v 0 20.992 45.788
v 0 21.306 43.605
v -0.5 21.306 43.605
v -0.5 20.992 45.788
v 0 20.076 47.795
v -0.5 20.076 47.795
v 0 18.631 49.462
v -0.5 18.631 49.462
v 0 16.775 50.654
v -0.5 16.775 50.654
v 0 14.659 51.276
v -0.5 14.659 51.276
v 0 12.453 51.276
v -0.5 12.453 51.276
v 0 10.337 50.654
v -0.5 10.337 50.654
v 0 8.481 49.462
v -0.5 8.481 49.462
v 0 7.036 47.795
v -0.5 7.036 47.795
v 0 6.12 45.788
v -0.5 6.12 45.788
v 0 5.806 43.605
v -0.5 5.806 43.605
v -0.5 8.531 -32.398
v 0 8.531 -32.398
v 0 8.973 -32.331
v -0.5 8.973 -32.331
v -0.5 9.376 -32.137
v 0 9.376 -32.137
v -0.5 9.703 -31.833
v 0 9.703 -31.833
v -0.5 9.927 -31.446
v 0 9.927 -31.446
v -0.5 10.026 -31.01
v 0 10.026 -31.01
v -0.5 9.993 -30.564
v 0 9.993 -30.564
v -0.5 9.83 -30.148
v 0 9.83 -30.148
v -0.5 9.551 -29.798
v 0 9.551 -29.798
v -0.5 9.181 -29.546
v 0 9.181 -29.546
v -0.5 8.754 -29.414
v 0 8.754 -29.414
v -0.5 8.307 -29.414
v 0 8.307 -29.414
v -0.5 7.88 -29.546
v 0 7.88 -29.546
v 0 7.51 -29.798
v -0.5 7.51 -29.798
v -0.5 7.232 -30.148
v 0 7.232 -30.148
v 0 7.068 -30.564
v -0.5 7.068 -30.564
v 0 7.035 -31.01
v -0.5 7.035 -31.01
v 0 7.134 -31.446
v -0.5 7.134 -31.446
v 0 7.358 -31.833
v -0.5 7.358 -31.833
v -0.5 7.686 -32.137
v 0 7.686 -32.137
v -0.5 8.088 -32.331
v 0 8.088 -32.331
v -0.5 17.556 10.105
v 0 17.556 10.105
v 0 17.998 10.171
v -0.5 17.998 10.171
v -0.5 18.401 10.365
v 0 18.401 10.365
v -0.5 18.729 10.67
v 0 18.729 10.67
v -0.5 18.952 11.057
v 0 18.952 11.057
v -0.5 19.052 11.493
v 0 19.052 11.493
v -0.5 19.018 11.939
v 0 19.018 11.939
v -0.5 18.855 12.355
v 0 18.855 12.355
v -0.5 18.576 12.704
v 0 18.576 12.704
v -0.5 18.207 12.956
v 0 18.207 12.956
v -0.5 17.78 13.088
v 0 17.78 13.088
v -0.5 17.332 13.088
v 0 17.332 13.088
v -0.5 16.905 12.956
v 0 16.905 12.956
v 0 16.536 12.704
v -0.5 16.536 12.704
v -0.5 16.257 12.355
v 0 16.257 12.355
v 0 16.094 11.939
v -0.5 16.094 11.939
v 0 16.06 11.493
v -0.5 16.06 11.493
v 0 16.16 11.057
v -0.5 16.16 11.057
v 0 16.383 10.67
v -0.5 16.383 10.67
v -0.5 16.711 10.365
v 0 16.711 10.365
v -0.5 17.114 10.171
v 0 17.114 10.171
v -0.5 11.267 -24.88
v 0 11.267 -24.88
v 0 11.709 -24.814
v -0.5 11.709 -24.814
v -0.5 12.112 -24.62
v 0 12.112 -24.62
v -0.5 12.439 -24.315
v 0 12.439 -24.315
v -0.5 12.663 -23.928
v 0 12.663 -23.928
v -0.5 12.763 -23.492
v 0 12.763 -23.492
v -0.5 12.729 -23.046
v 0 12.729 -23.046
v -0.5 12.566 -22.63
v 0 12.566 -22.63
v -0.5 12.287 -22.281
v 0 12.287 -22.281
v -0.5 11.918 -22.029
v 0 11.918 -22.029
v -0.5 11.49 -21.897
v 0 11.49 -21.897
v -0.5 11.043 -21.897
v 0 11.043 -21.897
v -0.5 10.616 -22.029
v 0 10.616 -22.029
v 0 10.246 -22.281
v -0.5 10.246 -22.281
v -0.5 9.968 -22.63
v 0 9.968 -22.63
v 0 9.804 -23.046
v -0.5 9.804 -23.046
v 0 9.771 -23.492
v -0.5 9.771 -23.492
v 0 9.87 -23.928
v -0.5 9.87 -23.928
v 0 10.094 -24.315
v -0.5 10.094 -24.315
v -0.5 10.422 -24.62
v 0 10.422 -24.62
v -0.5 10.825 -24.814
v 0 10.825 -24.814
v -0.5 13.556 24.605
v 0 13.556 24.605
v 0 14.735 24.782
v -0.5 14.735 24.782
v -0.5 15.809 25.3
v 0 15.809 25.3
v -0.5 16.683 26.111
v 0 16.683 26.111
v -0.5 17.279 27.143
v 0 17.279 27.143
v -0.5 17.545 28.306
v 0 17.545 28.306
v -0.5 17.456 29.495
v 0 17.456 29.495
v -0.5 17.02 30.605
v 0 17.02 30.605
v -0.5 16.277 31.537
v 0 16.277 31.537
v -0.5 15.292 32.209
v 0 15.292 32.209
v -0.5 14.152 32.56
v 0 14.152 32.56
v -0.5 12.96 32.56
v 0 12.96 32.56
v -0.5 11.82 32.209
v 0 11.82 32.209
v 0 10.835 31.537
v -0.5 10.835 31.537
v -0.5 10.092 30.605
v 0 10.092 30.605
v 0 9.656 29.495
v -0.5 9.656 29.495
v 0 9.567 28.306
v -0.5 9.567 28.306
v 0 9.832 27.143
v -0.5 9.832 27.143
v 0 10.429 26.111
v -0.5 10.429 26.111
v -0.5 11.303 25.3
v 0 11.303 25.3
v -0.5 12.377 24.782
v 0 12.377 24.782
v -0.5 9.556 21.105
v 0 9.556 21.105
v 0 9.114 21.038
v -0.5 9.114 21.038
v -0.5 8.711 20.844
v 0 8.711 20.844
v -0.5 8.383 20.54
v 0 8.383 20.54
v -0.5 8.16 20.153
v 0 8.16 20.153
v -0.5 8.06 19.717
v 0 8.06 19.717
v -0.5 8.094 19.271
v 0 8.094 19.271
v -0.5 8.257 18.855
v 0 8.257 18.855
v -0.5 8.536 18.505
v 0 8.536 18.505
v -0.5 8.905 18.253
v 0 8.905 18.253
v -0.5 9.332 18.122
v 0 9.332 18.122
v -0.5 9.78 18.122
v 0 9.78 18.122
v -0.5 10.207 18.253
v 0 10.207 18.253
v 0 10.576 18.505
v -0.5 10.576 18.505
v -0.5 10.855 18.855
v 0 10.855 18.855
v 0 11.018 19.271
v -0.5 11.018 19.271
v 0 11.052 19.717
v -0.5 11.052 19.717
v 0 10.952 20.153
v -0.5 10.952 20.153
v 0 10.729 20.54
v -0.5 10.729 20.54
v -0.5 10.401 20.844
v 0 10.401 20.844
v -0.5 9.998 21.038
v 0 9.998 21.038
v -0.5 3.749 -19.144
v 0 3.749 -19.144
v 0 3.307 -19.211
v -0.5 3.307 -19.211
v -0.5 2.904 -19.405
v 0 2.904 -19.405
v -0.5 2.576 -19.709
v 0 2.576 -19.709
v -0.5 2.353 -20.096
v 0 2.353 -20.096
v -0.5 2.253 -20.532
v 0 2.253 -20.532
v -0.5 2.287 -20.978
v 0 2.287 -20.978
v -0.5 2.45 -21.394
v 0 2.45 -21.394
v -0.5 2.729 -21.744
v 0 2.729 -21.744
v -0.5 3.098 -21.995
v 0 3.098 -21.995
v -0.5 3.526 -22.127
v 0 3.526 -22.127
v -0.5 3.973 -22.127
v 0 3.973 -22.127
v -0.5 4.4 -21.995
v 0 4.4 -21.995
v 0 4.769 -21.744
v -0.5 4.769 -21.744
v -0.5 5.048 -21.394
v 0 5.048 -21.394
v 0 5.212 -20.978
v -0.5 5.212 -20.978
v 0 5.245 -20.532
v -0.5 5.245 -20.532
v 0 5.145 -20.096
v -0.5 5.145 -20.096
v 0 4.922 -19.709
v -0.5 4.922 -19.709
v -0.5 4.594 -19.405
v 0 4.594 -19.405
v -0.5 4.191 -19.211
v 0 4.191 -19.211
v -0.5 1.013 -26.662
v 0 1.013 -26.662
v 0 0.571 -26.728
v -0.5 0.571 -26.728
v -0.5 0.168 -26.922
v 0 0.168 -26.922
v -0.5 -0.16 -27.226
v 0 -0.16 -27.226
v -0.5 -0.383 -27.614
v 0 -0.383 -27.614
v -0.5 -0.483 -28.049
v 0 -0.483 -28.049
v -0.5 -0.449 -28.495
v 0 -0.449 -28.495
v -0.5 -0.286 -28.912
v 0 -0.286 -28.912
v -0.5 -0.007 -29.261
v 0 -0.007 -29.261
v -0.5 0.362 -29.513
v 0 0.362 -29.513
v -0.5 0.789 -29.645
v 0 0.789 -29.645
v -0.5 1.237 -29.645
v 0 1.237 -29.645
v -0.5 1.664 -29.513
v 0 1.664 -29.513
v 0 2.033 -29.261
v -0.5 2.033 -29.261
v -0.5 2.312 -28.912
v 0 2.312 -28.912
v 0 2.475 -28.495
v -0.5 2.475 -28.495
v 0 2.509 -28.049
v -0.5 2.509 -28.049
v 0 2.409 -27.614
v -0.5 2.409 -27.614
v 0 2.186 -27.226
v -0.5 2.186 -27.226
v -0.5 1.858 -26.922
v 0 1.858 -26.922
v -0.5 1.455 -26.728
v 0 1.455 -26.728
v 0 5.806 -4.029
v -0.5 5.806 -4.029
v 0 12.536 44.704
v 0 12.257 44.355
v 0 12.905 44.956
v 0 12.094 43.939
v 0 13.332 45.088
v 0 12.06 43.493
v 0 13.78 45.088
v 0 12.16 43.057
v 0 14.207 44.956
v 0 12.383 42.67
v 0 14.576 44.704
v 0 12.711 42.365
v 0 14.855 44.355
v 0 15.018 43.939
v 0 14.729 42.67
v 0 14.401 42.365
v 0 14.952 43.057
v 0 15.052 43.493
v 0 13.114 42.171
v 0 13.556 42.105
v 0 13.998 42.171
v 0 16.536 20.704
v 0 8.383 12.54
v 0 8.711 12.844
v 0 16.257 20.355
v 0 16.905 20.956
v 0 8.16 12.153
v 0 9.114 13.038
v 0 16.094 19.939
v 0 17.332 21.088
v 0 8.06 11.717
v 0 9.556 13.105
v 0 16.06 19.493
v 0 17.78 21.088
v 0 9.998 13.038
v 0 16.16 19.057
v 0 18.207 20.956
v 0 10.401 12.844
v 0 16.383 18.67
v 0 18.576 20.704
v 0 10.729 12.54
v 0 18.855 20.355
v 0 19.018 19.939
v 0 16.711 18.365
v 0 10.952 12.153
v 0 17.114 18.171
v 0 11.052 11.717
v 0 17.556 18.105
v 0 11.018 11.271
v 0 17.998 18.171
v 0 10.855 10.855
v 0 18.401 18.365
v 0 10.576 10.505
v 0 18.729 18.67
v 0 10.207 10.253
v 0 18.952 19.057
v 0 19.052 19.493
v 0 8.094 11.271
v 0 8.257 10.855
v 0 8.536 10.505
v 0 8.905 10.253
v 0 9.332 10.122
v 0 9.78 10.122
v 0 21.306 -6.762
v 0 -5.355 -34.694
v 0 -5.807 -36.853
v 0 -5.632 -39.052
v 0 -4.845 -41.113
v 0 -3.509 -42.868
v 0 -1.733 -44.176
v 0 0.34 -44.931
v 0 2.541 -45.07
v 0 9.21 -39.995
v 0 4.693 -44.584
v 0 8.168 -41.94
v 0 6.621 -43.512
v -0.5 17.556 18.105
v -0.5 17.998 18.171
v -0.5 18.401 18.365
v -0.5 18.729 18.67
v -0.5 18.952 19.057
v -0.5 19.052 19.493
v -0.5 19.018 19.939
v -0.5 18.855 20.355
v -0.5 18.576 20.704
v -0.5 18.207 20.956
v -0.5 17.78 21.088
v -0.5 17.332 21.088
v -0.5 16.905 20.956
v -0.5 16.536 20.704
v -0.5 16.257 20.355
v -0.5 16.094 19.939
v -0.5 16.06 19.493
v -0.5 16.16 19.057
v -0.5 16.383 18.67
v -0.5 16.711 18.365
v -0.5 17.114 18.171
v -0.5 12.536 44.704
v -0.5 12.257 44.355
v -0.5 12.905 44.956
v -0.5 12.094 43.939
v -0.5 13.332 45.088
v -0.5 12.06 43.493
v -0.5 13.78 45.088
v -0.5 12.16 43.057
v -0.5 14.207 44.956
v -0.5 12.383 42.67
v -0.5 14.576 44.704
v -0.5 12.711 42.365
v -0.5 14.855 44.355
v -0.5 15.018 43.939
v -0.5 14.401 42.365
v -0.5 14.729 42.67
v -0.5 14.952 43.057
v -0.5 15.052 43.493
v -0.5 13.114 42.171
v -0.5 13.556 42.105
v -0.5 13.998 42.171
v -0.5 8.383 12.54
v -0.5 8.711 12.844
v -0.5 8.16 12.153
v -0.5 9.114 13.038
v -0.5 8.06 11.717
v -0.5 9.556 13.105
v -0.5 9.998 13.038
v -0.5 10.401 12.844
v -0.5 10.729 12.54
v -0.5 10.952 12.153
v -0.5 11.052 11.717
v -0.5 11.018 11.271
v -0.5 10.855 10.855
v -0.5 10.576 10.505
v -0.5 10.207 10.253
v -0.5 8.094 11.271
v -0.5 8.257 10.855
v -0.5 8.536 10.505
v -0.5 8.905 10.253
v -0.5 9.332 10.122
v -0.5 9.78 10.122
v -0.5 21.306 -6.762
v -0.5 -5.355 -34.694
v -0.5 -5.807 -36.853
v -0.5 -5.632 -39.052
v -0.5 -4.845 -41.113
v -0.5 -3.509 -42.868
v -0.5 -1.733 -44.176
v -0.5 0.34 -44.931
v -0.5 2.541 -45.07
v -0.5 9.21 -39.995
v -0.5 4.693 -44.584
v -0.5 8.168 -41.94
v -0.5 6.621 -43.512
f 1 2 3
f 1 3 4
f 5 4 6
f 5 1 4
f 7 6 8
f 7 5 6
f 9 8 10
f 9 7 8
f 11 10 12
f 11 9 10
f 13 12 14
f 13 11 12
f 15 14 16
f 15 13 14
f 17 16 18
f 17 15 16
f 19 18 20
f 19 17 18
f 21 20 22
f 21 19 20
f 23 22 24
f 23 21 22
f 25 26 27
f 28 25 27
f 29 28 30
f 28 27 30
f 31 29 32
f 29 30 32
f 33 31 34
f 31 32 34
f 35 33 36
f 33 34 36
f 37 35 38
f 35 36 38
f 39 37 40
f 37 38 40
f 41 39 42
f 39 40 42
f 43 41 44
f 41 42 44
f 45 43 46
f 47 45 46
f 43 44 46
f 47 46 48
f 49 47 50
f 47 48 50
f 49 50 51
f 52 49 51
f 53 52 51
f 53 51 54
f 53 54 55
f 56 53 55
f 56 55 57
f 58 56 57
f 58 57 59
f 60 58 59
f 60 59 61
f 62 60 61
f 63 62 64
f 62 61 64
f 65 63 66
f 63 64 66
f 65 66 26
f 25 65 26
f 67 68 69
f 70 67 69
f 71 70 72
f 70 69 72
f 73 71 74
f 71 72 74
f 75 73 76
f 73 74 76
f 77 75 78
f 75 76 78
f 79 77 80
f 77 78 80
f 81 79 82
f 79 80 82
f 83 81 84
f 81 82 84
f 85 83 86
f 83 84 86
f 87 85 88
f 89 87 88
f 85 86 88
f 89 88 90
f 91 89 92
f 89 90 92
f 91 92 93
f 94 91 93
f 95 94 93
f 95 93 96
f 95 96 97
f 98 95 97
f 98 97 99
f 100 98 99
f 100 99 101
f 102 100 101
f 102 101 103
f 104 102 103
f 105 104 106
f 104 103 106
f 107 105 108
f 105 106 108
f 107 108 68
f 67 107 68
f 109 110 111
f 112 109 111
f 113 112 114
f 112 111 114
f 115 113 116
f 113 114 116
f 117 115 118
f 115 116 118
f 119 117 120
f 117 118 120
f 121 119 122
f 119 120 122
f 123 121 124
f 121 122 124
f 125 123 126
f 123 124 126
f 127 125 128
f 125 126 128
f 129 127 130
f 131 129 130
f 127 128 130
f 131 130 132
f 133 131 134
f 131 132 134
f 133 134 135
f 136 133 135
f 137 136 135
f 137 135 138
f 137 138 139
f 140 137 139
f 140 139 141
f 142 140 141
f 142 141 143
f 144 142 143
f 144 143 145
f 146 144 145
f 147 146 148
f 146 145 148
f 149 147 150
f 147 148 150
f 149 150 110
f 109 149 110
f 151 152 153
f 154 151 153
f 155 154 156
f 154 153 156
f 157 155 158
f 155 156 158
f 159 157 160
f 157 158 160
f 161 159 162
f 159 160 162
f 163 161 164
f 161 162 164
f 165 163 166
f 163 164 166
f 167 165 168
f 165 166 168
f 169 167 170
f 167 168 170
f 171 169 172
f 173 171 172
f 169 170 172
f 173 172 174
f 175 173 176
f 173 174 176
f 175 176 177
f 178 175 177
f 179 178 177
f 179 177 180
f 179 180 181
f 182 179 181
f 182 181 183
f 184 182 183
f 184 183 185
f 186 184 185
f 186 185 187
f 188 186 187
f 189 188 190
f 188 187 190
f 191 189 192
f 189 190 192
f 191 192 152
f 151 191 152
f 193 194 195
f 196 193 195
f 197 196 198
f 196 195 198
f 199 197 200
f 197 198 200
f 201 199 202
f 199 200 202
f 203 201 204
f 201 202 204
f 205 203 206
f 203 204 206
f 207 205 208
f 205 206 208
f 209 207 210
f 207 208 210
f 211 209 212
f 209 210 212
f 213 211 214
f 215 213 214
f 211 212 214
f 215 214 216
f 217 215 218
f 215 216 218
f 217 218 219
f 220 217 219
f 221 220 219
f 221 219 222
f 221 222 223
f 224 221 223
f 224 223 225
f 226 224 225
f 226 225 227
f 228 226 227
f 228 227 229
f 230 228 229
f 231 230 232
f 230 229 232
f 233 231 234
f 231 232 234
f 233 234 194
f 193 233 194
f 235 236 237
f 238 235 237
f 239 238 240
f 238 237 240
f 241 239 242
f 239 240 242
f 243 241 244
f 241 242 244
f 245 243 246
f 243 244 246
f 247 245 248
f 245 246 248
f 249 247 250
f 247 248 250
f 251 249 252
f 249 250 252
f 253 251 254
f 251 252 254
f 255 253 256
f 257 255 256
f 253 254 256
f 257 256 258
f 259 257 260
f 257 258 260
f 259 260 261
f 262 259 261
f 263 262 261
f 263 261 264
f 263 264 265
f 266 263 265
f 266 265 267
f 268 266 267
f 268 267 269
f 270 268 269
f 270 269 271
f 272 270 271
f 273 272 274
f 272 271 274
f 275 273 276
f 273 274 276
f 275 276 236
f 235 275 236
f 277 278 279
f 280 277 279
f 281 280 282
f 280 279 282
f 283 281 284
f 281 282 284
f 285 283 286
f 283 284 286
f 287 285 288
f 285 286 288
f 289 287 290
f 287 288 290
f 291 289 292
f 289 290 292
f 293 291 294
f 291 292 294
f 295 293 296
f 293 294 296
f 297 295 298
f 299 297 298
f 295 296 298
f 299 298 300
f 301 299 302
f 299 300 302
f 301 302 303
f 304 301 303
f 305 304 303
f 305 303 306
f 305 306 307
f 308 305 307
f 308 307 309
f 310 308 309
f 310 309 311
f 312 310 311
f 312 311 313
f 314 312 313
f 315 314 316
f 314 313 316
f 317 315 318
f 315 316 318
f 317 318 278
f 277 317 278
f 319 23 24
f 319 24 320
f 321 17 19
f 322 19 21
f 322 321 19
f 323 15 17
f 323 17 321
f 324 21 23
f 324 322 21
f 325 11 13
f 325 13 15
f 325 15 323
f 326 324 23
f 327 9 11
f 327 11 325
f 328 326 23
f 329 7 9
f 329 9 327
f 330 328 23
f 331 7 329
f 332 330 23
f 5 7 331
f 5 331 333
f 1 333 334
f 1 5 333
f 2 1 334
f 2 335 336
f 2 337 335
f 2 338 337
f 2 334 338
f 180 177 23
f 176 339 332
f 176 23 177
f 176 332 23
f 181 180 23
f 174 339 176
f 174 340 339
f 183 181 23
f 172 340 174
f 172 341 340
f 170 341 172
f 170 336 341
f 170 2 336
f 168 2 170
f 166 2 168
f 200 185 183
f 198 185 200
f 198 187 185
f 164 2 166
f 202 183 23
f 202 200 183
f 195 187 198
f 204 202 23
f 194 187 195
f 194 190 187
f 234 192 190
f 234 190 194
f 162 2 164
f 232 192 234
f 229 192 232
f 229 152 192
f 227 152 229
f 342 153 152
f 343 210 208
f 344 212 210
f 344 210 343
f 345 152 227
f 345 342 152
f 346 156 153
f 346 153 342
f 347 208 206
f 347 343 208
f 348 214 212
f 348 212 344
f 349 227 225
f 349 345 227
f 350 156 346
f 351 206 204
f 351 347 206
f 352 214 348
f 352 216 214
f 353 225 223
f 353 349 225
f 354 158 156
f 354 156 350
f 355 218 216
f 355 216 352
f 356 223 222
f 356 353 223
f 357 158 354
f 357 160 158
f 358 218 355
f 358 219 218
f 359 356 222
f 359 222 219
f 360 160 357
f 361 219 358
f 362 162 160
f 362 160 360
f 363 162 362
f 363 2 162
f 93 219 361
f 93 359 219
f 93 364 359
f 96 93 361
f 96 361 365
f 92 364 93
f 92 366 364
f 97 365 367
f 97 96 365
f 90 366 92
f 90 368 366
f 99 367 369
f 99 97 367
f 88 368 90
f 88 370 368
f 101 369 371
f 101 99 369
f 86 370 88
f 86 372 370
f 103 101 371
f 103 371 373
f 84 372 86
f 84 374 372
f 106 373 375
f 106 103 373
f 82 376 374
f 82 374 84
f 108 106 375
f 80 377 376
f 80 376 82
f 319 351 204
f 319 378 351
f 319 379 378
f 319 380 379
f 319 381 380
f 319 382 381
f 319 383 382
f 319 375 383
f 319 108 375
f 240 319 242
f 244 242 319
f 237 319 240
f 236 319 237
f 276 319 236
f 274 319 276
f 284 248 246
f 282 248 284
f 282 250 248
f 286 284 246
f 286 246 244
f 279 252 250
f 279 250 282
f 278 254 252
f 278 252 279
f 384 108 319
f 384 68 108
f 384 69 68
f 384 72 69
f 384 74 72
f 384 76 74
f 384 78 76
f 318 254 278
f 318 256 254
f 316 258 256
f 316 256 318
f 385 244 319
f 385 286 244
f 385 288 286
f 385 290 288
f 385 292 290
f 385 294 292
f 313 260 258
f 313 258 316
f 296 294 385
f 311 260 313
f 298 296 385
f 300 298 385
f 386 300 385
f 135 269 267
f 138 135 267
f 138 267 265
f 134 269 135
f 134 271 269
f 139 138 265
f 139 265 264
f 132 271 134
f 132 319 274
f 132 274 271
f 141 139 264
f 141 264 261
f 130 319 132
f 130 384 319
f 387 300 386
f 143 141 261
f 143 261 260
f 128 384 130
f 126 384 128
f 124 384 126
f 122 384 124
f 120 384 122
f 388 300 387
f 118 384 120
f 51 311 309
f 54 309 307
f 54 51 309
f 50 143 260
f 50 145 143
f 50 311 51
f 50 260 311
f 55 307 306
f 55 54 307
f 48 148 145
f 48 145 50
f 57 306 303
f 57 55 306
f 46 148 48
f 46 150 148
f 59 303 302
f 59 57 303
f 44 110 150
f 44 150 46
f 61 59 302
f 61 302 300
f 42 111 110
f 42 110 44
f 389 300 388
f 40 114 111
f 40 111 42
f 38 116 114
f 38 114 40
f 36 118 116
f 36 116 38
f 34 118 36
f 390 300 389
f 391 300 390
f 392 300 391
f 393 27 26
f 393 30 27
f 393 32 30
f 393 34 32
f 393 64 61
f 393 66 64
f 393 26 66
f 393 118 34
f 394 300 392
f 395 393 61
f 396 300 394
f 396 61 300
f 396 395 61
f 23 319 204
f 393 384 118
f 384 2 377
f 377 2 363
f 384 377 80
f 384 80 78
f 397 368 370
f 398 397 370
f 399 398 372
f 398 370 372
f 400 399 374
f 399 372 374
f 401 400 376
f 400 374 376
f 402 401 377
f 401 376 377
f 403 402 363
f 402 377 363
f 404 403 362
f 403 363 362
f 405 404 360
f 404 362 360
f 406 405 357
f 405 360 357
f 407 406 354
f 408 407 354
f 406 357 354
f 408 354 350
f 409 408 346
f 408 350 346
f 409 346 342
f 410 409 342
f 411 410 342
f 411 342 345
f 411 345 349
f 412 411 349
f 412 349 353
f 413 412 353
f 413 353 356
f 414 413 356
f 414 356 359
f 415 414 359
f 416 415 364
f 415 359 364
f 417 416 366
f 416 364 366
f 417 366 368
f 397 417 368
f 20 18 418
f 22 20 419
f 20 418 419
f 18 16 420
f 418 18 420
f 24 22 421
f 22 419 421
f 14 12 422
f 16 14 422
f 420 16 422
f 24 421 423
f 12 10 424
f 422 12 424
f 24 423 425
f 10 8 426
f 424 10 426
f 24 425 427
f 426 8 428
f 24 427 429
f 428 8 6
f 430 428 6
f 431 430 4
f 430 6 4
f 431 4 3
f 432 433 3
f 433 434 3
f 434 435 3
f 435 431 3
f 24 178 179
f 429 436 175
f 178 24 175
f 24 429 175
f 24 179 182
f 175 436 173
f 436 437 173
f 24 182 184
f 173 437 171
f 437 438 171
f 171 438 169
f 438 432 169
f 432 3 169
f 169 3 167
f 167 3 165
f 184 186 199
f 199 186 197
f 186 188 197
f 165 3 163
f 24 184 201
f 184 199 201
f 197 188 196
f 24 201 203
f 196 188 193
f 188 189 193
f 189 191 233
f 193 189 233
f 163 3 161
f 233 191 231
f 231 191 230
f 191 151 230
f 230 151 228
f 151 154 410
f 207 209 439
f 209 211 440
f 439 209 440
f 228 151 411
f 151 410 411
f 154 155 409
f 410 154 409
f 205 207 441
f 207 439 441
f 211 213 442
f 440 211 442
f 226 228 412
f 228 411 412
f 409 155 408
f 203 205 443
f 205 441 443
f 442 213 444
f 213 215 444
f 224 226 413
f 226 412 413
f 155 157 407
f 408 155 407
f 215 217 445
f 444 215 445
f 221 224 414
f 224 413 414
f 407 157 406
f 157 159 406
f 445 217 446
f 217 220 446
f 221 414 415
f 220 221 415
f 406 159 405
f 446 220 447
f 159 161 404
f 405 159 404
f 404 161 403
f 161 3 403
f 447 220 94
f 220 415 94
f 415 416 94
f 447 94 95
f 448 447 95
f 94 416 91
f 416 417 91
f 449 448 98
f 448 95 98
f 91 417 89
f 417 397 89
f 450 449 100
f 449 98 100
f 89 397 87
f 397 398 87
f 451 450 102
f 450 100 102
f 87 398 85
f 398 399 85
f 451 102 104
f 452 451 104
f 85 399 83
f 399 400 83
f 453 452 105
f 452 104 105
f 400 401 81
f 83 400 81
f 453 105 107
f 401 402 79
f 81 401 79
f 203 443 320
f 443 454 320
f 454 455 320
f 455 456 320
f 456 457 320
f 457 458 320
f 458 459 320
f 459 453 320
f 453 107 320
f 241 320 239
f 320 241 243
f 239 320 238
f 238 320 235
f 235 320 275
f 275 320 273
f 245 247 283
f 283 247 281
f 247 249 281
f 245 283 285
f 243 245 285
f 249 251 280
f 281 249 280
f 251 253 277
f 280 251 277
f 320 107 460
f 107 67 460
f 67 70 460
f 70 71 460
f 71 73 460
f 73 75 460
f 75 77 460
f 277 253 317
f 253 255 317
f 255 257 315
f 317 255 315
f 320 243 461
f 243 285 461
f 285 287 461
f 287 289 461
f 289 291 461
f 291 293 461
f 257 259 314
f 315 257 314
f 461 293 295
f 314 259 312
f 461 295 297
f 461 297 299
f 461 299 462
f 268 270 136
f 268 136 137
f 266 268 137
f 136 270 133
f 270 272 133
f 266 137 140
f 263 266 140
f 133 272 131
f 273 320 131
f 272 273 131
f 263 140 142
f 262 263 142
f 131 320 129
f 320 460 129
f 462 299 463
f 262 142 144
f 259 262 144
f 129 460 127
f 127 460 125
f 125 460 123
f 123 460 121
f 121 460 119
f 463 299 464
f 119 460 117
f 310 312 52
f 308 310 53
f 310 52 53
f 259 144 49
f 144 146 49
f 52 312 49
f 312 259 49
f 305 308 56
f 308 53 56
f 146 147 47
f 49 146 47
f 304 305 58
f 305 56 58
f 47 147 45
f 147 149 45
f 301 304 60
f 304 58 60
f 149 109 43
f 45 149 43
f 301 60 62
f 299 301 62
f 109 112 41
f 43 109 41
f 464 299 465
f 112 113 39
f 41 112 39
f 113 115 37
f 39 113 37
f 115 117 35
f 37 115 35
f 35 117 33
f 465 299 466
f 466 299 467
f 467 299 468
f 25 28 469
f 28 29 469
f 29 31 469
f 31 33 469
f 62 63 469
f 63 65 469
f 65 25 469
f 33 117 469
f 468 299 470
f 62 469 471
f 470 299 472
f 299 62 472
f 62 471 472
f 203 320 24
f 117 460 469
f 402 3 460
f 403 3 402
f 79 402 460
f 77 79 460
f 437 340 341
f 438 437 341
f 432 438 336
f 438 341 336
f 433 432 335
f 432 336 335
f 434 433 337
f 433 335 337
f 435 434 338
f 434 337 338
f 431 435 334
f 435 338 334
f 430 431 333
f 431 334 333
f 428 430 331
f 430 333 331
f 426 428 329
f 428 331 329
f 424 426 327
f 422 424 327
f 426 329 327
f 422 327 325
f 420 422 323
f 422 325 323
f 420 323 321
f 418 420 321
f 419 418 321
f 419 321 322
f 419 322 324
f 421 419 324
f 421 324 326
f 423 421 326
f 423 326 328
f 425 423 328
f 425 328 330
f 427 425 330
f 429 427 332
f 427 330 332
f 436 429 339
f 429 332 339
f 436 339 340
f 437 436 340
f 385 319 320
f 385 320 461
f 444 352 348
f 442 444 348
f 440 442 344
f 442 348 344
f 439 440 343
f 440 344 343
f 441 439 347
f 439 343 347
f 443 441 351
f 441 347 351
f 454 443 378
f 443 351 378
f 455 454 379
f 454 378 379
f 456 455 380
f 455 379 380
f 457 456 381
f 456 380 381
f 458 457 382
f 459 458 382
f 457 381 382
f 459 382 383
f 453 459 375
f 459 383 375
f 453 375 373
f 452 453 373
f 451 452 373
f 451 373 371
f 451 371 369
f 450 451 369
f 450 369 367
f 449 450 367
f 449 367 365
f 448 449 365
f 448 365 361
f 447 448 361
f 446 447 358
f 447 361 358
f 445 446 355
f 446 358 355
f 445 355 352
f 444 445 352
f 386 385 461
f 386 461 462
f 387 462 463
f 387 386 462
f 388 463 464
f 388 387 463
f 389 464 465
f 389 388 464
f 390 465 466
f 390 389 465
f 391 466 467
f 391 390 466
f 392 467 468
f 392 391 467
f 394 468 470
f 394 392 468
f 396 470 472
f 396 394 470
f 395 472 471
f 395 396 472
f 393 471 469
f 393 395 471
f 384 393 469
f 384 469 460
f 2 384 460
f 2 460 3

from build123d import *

# Parameters (mm, degrees)
CROQUIS1_R        = 1.5
CROQUIS1_R_2      = 4
BRIDA_BASE1_DEPTH = 0.5


# Sheet-metal steps are written as plain solids
with BuildPart() as part:
    # Croquis1 → Brida base1 (new body)
    with BuildSketch(Plane(origin=(0, 0, 0), x_dir=(0, 0, -1), z_dir=(1, 0, 0))):
        with BuildLine():
            Line((-43.604767051, 5.805989848), (4.028698849, 5.805989848))
            Line((4.028698849, 5.805989848), (34.694125945, -5.355312836))
            ThreePointArc((34.694125945, -5.355312836), (44.627399867, -0.723351136), (39.995438167, 9.209922786))
            Line((39.995438167, 9.209922786), (6.76176705, 21.305989848))
            Line((6.76176705, 21.305989848), (-43.604767051, 21.305989848))
            ThreePointArc((-43.604767051, 21.305989848), (-51.354767051, 13.555989848), (-43.604767051, 5.805989848))
        make_face()
        with Locations((-19.604767051, 17.555989848)):
            Circle(CROQUIS1_R, mode=Mode.SUBTRACT)
        with Locations(Location((-19.604767051, 9.555989848, 0), (0, 0, 180))):
            Circle(CROQUIS1_R, mode=Mode.SUBTRACT)
        with Locations((-43.604767051, 13.555989848)):
            Circle(CROQUIS1_R, mode=Mode.SUBTRACT)
        with Locations((23.380149081, 11.2667268)):
            Circle(CROQUIS1_R, mode=Mode.SUBTRACT)
        with Locations(Location((20.643987934, 3.749185834, 0), (0, 0, 180))):
            Circle(CROQUIS1_R, mode=Mode.SUBTRACT)
        with Locations((-28.604767051, 13.555989848)):
            Circle(CROQUIS1_R_2, mode=Mode.SUBTRACT)
        with Locations((30.897690047, 8.530565653)):
            Circle(CROQUIS1_R, mode=Mode.SUBTRACT)
        with Locations(Location((28.161528901, 1.013024687, 0), (0, 0, 180))):
            Circle(CROQUIS1_R, mode=Mode.SUBTRACT)
        with Locations((-11.604767051, 17.555989848)):
            Circle(CROQUIS1_R, mode=Mode.SUBTRACT)
        with Locations(Location((-11.604767051, 9.555989848, 0), (0, 0, 180))):
            Circle(CROQUIS1_R, mode=Mode.SUBTRACT)
    extrude(amount=-BRIDA_BASE1_DEPTH)


solid = part.part
